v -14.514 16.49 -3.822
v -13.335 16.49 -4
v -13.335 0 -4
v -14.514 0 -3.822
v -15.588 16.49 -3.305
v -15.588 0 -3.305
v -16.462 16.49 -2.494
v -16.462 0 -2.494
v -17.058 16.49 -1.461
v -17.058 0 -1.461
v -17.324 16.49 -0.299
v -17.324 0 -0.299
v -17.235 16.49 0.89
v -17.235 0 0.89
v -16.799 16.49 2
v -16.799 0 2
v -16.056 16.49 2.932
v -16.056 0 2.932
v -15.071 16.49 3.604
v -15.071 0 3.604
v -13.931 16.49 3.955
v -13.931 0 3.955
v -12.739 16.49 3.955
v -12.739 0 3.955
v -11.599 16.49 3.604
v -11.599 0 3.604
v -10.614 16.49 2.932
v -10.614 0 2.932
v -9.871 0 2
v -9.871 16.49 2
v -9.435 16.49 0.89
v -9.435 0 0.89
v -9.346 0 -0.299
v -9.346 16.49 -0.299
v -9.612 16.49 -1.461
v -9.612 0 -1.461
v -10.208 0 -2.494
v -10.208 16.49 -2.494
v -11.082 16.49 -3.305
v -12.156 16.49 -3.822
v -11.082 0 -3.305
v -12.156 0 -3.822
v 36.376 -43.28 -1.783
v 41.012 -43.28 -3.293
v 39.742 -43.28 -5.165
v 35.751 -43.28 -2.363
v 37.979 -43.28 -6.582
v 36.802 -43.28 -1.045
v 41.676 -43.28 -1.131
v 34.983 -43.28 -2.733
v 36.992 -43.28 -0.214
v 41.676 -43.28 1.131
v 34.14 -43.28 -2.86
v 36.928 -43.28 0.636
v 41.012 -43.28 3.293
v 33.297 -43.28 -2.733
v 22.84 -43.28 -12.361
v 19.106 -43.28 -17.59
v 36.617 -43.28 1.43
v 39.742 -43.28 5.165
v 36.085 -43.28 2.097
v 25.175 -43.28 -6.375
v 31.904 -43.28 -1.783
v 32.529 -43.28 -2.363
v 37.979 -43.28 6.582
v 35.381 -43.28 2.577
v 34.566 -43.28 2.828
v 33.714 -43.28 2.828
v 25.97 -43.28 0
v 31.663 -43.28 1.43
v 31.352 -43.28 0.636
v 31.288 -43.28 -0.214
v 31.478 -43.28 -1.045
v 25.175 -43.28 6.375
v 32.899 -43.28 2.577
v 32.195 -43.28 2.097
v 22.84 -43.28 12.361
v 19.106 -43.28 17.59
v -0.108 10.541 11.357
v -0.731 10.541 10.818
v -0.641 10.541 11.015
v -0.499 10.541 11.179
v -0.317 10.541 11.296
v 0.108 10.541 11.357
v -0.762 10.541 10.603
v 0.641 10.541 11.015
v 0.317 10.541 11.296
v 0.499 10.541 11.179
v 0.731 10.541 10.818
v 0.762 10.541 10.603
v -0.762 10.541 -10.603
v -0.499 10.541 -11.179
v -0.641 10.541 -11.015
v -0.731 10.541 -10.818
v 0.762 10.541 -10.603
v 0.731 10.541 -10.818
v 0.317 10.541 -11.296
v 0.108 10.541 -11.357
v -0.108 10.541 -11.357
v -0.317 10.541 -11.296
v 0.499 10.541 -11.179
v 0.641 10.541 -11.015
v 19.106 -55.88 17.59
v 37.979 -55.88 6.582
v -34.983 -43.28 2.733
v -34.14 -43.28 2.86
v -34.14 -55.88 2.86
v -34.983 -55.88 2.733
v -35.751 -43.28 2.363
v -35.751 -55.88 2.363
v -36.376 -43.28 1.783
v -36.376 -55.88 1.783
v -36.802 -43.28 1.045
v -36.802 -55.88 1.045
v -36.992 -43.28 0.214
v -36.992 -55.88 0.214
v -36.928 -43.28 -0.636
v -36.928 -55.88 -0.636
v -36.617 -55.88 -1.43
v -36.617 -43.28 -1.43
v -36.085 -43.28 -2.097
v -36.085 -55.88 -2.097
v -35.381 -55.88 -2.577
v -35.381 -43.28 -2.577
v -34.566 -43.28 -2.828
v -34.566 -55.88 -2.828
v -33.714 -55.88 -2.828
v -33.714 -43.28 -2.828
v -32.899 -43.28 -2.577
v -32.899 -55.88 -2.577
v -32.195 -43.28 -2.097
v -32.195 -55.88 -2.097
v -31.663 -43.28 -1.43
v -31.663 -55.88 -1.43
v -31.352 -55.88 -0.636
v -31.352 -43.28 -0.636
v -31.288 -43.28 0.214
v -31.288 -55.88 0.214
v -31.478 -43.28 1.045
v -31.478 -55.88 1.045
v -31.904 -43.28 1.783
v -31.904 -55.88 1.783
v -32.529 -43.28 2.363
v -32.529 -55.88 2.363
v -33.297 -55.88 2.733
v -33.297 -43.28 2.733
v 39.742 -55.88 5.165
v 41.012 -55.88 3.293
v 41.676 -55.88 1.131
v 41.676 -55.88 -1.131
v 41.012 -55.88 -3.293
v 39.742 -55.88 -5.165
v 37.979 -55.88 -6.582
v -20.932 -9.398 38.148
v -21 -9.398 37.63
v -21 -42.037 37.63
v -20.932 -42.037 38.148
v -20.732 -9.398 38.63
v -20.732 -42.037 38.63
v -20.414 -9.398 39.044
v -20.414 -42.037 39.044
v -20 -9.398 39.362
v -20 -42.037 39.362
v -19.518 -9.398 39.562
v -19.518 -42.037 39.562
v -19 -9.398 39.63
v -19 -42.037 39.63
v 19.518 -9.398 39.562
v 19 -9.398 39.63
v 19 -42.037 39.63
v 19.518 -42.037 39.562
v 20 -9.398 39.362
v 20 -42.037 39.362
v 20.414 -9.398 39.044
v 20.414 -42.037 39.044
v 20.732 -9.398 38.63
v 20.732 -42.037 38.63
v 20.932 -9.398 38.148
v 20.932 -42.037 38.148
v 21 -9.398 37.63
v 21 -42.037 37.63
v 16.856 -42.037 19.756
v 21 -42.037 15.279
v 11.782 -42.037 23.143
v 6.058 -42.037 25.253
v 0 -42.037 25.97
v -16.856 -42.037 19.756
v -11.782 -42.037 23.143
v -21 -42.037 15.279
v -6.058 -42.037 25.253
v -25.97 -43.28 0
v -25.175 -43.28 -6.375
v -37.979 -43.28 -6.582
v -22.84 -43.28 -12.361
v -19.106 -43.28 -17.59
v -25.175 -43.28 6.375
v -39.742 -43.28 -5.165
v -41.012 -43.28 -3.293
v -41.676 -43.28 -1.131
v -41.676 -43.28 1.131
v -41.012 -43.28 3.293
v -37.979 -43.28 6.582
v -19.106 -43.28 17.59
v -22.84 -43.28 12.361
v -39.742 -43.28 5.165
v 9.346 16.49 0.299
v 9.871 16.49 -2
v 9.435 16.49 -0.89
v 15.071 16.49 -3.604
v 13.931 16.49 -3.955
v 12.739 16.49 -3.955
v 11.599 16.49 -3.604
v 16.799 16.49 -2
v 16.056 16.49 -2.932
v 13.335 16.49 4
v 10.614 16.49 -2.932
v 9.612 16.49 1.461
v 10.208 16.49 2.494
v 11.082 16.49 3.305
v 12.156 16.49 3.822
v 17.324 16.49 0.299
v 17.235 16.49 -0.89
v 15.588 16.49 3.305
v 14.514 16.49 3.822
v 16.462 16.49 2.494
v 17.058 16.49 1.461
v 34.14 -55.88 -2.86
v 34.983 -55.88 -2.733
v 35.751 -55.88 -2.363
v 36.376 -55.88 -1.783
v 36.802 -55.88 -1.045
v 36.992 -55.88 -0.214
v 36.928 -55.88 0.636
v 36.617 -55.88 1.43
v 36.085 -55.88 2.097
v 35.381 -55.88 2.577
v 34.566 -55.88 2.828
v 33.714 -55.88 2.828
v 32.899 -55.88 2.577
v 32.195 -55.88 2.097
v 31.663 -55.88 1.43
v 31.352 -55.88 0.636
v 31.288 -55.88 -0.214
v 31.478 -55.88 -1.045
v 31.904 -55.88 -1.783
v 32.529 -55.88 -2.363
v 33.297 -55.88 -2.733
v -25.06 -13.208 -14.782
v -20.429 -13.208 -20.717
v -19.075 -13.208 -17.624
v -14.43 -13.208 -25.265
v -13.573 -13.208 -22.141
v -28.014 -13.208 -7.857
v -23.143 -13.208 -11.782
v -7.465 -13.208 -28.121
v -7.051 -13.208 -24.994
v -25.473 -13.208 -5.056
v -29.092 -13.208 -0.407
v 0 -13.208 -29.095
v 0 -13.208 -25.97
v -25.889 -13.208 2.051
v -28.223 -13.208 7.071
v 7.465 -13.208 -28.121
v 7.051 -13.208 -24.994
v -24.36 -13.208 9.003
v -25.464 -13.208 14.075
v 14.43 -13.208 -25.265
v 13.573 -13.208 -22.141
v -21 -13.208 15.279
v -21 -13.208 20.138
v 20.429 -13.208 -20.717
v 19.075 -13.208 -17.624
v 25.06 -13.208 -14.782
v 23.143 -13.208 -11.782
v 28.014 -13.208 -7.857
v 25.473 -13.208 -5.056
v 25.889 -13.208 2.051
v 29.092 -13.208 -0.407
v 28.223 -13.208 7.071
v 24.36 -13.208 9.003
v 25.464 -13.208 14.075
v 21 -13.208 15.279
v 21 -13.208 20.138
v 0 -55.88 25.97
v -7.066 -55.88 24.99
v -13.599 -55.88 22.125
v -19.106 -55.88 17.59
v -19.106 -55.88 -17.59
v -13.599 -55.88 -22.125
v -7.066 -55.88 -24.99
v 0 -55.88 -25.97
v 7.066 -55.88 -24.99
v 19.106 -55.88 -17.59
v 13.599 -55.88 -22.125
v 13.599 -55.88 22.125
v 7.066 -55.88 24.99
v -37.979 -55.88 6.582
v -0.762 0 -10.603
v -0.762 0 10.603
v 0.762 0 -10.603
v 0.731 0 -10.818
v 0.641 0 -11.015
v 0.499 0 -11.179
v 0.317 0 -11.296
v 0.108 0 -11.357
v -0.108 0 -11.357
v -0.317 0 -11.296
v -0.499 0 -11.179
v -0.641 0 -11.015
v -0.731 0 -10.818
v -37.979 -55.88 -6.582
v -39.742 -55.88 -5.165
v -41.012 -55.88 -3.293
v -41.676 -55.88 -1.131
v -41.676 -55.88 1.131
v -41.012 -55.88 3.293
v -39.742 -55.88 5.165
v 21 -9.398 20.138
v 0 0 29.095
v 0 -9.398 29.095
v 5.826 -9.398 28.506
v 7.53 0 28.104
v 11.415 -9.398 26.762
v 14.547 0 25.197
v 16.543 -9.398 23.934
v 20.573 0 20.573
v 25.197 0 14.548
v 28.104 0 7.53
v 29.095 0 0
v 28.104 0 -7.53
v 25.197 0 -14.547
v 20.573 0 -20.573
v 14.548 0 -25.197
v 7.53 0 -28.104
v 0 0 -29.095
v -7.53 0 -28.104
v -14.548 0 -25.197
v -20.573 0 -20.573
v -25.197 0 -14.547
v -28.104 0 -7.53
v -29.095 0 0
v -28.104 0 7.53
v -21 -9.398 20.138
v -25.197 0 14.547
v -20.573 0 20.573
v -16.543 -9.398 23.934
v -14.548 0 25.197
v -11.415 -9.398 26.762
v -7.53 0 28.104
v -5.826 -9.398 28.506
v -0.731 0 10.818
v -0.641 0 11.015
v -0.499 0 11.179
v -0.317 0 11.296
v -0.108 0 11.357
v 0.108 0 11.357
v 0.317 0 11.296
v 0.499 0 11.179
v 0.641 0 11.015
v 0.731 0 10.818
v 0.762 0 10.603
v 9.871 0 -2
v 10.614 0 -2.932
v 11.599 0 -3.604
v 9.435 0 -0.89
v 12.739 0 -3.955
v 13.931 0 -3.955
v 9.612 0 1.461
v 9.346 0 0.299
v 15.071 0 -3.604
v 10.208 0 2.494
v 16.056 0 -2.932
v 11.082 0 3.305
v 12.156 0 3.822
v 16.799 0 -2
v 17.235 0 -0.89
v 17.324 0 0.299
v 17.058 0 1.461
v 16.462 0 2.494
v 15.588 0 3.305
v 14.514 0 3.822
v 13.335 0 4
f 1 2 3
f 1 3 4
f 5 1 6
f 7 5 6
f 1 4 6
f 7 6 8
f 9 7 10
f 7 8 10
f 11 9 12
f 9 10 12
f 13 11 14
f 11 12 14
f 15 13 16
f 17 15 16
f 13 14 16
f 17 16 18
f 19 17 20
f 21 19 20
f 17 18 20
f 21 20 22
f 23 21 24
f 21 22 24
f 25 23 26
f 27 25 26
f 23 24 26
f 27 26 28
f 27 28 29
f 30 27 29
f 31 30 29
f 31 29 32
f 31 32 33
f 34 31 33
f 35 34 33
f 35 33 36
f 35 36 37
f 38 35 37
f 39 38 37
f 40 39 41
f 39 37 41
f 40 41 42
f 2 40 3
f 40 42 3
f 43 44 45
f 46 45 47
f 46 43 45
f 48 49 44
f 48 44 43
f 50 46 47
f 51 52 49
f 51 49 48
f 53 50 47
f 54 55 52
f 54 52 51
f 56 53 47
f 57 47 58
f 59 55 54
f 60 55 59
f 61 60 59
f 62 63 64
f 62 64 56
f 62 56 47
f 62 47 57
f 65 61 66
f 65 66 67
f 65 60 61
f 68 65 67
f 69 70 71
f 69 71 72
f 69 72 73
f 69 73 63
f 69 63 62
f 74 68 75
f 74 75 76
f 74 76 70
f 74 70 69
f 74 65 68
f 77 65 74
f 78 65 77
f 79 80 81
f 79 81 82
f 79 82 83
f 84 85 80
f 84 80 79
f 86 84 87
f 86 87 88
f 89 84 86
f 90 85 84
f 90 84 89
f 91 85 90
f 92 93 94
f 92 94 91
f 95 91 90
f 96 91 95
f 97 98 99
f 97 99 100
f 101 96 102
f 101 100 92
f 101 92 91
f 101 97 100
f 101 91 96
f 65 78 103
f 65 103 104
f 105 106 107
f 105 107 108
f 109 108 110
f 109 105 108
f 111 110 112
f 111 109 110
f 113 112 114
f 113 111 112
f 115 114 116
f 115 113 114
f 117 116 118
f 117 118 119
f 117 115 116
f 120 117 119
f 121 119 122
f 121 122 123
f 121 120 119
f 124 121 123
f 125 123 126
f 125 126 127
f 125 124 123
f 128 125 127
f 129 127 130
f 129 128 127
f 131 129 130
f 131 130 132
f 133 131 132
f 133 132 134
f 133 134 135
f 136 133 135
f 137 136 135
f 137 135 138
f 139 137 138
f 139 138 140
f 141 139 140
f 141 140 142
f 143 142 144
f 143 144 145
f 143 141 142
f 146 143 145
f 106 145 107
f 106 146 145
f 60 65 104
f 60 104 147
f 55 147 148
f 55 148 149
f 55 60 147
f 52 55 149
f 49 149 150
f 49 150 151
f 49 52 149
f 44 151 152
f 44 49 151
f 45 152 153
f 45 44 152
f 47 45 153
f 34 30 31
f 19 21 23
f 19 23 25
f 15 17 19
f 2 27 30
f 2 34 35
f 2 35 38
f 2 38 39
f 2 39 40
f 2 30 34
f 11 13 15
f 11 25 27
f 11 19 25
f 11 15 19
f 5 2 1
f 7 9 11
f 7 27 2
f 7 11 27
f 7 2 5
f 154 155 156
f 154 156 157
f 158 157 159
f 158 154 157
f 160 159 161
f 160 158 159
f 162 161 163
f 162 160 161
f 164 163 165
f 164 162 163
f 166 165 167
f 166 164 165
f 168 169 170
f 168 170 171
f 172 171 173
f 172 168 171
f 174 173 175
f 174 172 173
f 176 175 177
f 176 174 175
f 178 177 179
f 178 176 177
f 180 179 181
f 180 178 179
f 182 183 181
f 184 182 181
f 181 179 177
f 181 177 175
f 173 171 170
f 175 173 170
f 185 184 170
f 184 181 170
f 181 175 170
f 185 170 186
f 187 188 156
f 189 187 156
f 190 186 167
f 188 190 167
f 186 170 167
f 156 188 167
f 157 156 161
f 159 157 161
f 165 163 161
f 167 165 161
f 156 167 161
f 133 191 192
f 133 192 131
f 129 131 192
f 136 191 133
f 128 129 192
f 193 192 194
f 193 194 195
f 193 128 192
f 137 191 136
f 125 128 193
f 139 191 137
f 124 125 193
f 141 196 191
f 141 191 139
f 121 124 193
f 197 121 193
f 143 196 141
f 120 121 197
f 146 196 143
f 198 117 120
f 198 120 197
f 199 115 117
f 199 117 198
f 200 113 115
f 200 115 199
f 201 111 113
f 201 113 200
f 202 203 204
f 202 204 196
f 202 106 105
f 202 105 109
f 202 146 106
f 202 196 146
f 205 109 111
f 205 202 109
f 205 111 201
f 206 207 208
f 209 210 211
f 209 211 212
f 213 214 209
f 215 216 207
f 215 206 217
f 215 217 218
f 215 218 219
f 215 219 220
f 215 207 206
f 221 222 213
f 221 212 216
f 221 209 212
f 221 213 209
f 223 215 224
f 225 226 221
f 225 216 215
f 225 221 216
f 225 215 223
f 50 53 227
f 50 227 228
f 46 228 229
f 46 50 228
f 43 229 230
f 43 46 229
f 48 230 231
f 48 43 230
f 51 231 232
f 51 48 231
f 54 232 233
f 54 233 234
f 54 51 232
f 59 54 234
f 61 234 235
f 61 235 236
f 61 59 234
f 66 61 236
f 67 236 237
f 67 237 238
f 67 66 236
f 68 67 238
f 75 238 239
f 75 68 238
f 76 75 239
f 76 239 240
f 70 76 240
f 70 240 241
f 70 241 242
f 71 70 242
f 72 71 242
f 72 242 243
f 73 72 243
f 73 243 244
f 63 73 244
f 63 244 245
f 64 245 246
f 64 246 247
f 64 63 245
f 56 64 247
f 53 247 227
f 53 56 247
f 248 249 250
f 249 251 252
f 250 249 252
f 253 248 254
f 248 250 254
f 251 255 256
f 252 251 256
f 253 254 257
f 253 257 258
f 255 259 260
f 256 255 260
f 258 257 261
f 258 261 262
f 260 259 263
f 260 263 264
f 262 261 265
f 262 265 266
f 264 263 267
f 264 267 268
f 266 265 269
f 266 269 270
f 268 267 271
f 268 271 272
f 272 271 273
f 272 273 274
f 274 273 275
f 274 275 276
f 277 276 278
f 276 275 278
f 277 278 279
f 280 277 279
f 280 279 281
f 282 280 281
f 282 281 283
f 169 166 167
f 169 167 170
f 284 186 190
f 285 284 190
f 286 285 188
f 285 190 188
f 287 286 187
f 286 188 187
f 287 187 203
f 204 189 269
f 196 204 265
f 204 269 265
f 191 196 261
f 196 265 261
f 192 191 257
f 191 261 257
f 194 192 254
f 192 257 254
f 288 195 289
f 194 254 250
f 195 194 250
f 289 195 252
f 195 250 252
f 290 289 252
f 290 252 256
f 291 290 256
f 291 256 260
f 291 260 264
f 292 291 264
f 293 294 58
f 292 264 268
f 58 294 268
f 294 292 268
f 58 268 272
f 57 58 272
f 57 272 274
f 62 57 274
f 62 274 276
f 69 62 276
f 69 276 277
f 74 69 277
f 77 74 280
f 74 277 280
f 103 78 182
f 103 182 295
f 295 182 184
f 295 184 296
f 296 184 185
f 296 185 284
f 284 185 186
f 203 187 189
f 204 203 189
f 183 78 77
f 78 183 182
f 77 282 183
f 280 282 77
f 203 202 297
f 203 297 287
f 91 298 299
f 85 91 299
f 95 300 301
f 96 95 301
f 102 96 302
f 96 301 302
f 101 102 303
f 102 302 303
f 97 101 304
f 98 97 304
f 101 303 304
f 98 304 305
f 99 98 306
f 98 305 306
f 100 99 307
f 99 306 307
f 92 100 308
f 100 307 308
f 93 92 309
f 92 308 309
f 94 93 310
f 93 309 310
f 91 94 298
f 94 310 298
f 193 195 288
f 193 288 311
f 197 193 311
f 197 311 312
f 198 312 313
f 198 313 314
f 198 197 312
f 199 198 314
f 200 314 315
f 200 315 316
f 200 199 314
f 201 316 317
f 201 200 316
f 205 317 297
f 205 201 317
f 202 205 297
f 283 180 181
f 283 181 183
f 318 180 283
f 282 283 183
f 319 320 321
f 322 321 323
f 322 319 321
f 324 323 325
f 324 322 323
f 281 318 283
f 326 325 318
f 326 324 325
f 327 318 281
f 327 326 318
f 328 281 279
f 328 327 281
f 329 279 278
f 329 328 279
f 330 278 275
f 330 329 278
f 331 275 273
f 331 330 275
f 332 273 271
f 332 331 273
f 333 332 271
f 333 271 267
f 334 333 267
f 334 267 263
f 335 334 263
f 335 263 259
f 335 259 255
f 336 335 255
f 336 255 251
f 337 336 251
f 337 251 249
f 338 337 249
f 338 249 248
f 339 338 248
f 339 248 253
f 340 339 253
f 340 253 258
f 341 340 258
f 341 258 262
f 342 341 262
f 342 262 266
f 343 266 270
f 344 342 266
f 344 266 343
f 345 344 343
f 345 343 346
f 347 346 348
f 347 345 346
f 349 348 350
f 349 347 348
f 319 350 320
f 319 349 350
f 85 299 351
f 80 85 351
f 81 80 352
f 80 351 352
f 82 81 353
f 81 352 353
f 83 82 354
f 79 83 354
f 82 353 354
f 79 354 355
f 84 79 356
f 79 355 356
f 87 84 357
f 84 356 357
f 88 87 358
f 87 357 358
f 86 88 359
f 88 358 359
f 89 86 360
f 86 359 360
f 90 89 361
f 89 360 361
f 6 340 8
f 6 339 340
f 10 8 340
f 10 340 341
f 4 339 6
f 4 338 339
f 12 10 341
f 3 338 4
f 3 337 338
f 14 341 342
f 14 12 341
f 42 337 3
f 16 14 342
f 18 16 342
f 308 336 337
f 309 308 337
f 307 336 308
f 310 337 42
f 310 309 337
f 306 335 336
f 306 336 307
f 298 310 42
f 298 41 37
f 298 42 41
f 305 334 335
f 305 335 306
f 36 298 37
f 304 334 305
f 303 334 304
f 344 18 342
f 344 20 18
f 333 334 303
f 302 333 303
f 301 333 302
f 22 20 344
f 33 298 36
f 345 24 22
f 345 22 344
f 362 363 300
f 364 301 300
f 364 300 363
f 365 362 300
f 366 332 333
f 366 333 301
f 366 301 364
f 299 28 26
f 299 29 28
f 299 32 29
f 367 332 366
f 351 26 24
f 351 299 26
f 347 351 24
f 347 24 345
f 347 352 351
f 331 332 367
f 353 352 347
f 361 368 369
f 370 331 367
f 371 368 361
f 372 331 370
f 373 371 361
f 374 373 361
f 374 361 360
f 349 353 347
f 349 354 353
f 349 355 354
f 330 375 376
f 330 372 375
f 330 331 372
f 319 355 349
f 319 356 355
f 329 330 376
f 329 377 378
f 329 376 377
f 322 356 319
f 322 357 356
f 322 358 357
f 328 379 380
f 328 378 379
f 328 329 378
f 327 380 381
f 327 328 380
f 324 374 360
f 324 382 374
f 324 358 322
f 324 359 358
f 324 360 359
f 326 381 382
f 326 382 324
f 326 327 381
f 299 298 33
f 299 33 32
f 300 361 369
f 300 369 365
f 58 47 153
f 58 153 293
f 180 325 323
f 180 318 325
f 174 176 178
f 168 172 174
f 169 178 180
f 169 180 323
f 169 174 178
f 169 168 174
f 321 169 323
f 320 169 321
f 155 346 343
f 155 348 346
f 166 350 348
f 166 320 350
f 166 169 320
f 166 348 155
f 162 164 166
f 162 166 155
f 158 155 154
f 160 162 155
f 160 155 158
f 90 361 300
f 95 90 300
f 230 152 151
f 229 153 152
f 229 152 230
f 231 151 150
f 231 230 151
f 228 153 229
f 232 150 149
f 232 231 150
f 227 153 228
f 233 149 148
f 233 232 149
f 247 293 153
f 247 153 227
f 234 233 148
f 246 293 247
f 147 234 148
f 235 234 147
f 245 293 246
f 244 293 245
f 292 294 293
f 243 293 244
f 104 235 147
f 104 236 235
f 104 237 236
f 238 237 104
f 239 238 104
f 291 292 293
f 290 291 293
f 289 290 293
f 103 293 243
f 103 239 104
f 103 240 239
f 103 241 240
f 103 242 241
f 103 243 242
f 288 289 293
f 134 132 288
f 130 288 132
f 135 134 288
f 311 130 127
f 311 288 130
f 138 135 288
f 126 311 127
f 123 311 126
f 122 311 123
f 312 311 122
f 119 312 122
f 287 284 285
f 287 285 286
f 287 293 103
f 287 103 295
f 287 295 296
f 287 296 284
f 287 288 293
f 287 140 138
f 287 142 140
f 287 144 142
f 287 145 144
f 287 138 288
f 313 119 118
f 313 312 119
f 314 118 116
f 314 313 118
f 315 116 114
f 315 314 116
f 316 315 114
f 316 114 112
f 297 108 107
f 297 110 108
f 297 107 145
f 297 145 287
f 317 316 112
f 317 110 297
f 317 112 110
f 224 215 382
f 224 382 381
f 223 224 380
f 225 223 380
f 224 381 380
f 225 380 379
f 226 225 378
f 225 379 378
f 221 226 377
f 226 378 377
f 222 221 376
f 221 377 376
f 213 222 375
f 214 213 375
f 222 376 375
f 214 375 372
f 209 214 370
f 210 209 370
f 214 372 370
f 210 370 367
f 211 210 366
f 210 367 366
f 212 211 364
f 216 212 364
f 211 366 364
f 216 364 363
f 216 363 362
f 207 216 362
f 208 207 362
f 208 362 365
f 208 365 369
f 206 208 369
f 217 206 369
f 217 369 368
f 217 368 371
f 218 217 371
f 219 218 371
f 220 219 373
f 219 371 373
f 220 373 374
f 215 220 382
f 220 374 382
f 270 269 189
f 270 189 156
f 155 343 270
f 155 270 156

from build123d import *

# Parameters (mm, degrees)
SKETCH1_R           = 29.095
BOSS_EXTRUDE1_DEPTH = 13.208
SKETCH2_R           = 25.97
BOSS_EXTRUDE2_DEPTH = 42.672
BOSS_EXTRUDE3_START = -12.6
SKETCH3_R           = 2.86
BOSS_EXTRUDE3_DEPTH = 12.6
SKETCH4_R           = 4
BOSS_EXTRUDE4_DEPTH = 16.49
BOSS_EXTRUDE5_DEPTH = 10.541
BOSS_EXTRUDE6_START = -46.482
BOSS_EXTRUDE6_DEPTH = 32.639


with BuildPart() as part:
    # Sketch1 → Boss-Extrude1 (new body)
    with BuildSketch(Plane(origin=(0, 0, 0), x_dir=(1, 0, 0), z_dir=(0, 1, 0))):
        with Locations(Location((0, 0, 0), (0, 0, 270))):
            Circle(SKETCH1_R)
    extrude(amount=-BOSS_EXTRUDE1_DEPTH)

    # Sketch2 → Boss-Extrude2 (add)
    with BuildSketch(Plane.XZ.offset(13.208)):
        with Locations(Location((0, 0, 0), (0, 0, 90))):
            Circle(SKETCH2_R)
    extrude(amount=BOSS_EXTRUDE2_DEPTH)

    # Sketch3 → Boss-Extrude3 (add)
    # profile 1 of 2: a face of its own
    with BuildSketch(Plane.XZ.offset(55.88).offset(BOSS_EXTRUDE3_START)):
        with BuildLine():
            Line((37.979011894, -6.582278305), (19.106291889, -17.5895))
            ThreePointArc((19.106291889, -17.5895), (25.97, 0), (19.106291889, 17.5895))
            Line((19.106291889, 17.5895), (37.979011894, 6.582278305))
            ThreePointArc((37.979011894, 6.582278305), (41.76, 0), (37.979011894, -6.582278305))
        make_face()
        with Locations(Location((34.14, 0, 0), (0, 0, 270))):
            Circle(SKETCH3_R, mode=Mode.SUBTRACT)
    # profile 2 of 2: a face of its own
    with BuildSketch(Plane.XZ.offset(55.88).offset(BOSS_EXTRUDE3_START)):
        with BuildLine():
            Line((-37.979011894, 6.582278305), (-19.106291889, 17.5895))
            ThreePointArc((-19.106291889, 17.5895), (-25.97, 0), (-19.106291889, -17.5895))
            Line((-19.106291889, -17.5895), (-37.979011894, -6.582278305))
            ThreePointArc((-37.979011894, -6.582278305), (-41.76, 0), (-37.979011894, 6.582278305))
        make_face()
        with Locations(Location((-34.14, 0, 0), (0, 0, 90))):
            Circle(SKETCH3_R, mode=Mode.SUBTRACT)
    extrude(amount=BOSS_EXTRUDE3_DEPTH)

    # Sketch4 → Boss-Extrude4 (add)
    with BuildSketch(Plane(origin=(0, 0, 0), x_dir=(1, 0, 0), z_dir=(0, 1, 0))):
        with Locations(Location((13.335, 0, 0), (0, 0, 270))):
            Circle(SKETCH4_R)
        with Locations(Location((-13.335, 0, 0), (0, 0, 90))):
            Circle(SKETCH4_R)
    extrude(amount=BOSS_EXTRUDE4_DEPTH)

    # Sketch5 → Boss-Extrude5 (add)
    with BuildSketch(Plane(origin=(0, 0, 0), x_dir=(1, 0, 0), z_dir=(0, 1, 0))):
        with BuildLine():
            Line((-0.762, 10.603000191), (-0.762, -10.603000191))
            ThreePointArc((-0.762, -10.603000191), (0, -11.365), (0.762, -10.603000191))
            Line((0.762, -10.603000191), (0.762, 10.603000191))
            ThreePointArc((0.762, 10.603000191), (0, 11.365), (-0.762, 10.603000191))
        make_face()
    extrude(amount=BOSS_EXTRUDE5_DEPTH)

    # Sketch6 → Boss-Extrude6 (add)
    with BuildSketch(Plane.XZ.offset(55.88).offset(BOSS_EXTRUDE6_START)):
        with BuildLine():
            Line((-19, 39.63), (19, 39.63))
            ThreePointArc((19, 39.63), (20.414213562, 39.044213562), (21, 37.63))
            Line((21, 37.63), (21, 15.278772856))
            ThreePointArc((21, 15.278772856), (0, 25.97), (-21, 15.278772856))
            Line((-21, 15.278772856), (-21, 37.63))
            ThreePointArc((-21, 37.63), (-20.414213562, 39.044213562), (-19, 39.63))
        make_face()
    extrude(amount=BOSS_EXTRUDE6_DEPTH)


solid = part.part
